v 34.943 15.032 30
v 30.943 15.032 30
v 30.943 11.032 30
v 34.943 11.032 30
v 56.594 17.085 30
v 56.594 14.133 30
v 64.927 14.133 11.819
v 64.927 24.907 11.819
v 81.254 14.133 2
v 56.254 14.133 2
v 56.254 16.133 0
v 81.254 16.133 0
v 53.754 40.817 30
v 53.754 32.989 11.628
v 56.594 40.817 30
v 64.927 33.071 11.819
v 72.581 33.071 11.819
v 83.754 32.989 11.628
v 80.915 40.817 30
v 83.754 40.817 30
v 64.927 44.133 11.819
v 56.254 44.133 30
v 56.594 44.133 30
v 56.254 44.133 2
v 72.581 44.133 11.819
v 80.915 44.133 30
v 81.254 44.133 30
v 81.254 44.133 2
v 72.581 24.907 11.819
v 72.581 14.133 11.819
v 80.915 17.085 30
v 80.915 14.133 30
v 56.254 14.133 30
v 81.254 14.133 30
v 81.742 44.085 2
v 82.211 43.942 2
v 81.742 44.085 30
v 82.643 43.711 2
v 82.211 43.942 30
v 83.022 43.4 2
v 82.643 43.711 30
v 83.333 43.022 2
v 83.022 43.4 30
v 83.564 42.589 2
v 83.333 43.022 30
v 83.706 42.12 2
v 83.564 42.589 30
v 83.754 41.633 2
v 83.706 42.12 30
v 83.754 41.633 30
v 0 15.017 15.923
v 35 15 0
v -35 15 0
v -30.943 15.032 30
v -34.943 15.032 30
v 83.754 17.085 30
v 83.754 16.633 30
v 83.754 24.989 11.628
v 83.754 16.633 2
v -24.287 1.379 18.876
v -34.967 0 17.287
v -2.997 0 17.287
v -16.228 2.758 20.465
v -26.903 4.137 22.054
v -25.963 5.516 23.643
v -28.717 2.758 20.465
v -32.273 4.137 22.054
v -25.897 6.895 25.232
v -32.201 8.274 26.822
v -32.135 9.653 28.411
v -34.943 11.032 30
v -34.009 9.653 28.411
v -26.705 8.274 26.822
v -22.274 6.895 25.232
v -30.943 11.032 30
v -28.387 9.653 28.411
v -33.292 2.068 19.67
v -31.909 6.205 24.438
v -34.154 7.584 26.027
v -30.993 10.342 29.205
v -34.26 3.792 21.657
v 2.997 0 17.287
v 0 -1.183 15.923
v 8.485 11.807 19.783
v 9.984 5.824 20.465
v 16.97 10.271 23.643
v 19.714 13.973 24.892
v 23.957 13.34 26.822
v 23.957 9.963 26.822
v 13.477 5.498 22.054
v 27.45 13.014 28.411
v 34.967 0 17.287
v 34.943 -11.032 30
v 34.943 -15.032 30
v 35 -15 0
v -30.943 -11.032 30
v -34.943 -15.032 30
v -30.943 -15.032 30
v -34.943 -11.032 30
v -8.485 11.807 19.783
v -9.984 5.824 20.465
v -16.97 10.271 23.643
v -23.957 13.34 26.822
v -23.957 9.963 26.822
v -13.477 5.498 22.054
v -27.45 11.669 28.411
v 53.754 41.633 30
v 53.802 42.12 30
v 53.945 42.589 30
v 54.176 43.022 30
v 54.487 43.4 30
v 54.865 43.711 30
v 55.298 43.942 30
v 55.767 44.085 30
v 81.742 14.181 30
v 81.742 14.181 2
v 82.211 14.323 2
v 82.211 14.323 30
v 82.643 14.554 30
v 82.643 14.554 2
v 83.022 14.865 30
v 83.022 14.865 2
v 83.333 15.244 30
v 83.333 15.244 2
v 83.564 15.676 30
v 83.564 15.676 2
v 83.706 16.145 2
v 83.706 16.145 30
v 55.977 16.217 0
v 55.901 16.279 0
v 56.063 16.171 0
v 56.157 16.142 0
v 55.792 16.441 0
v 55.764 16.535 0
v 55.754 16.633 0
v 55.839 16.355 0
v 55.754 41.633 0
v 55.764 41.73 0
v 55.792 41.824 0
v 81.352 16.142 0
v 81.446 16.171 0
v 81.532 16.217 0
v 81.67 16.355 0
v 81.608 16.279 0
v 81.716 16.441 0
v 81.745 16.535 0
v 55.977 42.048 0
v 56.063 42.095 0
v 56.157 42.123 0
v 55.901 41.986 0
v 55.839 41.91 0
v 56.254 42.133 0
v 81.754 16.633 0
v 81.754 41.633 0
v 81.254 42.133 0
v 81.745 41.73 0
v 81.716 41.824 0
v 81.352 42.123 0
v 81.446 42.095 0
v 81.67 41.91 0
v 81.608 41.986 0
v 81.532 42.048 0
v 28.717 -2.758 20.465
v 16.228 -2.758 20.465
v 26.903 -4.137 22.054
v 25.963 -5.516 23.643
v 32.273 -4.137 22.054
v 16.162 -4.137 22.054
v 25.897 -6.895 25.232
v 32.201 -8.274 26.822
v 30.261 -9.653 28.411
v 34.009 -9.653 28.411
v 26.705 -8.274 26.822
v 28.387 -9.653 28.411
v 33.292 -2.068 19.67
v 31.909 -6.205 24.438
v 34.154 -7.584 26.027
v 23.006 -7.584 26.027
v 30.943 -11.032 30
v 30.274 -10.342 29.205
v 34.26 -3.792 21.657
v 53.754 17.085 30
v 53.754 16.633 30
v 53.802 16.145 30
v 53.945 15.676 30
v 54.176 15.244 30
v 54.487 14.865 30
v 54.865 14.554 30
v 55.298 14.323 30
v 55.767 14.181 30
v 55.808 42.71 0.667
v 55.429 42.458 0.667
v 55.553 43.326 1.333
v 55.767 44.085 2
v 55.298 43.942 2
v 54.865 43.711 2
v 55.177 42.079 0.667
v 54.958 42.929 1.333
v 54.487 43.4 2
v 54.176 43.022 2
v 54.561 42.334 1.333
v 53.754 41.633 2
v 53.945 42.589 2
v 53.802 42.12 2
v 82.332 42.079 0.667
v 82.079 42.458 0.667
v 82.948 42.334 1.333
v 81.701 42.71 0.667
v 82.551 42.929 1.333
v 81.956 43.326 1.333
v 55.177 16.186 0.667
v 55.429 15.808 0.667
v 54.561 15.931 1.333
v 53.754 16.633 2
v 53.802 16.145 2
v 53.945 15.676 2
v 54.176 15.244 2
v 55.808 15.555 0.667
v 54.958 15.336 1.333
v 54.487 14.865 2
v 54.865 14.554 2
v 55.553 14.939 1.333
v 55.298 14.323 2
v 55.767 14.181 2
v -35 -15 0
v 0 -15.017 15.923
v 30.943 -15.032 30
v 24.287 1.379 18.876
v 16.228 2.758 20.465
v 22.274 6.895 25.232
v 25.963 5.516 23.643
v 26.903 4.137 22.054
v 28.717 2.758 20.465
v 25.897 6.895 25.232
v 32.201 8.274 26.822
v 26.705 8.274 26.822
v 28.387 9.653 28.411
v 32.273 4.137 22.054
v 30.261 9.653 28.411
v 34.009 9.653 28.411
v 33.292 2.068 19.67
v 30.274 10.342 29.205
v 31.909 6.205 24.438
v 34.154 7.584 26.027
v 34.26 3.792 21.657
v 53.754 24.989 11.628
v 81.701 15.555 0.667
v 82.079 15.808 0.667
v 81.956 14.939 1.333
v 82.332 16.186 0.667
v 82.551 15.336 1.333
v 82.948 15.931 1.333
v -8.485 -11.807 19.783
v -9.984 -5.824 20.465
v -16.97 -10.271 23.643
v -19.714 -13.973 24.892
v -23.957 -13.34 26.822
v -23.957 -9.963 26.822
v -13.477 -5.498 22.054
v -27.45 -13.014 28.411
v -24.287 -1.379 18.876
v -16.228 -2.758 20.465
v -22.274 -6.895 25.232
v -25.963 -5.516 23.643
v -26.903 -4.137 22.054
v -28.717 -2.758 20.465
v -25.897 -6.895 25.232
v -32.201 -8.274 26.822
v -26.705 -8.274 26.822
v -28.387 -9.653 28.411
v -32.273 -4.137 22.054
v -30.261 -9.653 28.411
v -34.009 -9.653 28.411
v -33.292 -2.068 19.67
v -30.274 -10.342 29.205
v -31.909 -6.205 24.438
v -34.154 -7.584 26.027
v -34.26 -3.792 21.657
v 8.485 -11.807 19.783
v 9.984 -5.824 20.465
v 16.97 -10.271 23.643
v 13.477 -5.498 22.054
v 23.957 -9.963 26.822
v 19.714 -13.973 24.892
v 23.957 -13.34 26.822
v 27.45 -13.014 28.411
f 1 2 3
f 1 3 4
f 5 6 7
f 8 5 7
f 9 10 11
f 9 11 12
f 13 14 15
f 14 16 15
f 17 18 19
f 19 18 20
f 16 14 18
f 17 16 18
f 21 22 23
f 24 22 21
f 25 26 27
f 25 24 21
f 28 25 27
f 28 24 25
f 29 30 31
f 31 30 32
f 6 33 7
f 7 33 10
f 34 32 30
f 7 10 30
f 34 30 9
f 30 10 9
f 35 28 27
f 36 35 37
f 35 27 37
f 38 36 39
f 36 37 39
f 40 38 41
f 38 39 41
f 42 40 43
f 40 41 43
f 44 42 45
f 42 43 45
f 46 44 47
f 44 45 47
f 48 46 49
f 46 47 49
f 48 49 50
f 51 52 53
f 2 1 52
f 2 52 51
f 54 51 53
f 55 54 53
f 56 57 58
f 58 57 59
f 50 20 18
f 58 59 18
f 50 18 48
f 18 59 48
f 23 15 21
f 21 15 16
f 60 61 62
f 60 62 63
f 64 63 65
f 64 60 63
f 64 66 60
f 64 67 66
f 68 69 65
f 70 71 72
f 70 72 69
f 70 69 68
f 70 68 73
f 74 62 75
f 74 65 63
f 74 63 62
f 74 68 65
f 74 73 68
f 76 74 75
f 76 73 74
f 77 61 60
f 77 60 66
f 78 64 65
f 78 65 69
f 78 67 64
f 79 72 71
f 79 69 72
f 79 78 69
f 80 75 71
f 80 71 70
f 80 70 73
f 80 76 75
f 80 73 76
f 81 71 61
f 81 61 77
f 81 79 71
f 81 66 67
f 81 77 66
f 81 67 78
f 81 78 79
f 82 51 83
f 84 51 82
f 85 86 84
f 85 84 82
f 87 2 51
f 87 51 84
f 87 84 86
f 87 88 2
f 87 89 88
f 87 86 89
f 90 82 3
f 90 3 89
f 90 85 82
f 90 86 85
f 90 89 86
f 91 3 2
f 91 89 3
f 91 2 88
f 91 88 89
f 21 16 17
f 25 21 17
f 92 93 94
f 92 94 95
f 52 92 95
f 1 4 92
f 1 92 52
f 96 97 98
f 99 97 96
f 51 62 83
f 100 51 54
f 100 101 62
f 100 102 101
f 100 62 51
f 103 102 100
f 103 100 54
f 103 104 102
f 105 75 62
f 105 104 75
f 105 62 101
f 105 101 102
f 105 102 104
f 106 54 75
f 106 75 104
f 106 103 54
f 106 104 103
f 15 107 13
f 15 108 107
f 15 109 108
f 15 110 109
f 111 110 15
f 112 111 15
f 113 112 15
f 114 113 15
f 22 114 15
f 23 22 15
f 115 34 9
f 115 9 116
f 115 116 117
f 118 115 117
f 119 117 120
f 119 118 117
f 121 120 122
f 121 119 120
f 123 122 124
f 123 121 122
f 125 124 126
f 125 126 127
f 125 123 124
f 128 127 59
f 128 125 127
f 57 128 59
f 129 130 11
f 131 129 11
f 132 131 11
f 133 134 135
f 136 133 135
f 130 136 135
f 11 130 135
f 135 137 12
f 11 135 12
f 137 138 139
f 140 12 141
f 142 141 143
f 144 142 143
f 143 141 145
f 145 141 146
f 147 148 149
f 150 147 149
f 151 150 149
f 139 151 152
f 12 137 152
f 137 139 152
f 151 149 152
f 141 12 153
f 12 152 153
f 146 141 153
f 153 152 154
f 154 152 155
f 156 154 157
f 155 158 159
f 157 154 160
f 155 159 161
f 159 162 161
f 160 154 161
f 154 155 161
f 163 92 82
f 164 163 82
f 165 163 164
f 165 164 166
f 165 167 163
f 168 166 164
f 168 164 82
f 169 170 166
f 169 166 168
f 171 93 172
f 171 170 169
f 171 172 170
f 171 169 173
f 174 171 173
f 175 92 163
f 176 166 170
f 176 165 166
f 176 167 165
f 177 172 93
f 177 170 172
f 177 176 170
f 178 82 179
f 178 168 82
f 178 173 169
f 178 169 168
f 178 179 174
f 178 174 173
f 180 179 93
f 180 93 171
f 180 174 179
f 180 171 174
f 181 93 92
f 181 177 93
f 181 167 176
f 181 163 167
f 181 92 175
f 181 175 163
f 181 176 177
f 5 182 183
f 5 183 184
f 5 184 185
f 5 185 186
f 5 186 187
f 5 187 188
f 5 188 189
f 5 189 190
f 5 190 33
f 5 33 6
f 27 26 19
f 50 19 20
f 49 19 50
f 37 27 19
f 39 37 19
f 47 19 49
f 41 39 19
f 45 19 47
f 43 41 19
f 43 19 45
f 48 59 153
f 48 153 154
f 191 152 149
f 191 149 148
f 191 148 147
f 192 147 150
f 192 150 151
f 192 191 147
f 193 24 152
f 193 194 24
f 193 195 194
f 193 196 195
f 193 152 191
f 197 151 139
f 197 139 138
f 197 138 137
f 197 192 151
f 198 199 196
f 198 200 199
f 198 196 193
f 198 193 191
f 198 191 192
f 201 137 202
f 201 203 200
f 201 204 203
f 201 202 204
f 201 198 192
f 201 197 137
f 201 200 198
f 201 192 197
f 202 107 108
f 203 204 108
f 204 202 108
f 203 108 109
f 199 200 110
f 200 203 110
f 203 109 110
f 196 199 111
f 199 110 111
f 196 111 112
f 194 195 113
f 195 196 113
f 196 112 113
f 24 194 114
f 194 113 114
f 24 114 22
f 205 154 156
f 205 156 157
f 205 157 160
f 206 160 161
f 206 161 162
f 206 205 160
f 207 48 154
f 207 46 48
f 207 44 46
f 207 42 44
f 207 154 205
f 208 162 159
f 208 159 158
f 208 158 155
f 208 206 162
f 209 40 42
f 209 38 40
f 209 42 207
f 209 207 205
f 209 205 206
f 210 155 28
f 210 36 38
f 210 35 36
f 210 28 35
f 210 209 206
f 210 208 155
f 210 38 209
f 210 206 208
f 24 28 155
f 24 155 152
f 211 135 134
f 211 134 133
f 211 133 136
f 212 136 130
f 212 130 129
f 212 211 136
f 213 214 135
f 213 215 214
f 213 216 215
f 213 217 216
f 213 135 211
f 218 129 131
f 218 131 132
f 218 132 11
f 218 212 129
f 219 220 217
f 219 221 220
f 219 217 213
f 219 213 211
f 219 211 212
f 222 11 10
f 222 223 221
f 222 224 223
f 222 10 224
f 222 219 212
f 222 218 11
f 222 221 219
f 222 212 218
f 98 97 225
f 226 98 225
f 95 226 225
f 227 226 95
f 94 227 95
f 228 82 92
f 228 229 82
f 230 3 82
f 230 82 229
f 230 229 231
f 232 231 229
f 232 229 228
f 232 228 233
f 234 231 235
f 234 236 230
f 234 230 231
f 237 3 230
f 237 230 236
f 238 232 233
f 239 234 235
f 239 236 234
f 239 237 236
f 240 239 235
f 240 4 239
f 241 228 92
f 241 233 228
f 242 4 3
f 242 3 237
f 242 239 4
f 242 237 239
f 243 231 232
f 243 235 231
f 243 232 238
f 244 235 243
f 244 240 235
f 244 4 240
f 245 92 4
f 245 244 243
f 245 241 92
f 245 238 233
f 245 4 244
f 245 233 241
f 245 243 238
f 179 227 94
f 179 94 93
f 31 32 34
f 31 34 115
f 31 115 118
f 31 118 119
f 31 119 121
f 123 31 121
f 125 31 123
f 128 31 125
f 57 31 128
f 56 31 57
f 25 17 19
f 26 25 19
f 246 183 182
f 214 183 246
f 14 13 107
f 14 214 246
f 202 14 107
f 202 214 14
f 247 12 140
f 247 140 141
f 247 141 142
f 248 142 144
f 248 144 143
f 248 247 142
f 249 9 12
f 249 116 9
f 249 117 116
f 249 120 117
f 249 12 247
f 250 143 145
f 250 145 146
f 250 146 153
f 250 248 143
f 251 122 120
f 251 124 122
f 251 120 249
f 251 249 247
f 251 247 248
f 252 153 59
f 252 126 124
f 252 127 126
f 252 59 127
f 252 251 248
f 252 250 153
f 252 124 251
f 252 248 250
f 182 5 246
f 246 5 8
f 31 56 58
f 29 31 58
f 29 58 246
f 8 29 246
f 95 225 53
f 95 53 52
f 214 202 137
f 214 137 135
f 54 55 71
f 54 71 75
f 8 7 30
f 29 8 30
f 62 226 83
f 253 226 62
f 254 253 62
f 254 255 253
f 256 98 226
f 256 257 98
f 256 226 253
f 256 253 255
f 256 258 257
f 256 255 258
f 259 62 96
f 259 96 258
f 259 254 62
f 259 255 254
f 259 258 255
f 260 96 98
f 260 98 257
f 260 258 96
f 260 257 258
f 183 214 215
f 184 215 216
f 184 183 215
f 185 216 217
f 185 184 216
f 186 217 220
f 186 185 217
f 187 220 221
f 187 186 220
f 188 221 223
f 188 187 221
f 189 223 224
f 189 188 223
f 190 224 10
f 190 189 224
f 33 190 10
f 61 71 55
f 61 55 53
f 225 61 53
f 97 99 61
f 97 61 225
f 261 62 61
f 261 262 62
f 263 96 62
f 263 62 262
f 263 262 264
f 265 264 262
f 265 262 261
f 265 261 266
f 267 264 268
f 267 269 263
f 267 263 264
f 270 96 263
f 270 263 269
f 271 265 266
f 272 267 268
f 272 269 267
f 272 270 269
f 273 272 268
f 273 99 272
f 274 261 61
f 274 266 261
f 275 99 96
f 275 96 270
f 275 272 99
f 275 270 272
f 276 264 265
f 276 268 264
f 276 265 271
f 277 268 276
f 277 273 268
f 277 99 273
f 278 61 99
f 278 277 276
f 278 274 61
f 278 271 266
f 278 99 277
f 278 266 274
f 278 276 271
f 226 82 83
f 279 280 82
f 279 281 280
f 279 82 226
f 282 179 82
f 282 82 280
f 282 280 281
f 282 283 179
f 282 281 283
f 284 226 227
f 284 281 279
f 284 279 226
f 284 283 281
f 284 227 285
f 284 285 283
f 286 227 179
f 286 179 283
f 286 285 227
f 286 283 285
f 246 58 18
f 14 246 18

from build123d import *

# Parameters (mm, degrees)
F0_W      = 70
F0_H      = 30
F2_W      = 4
F2_H      = 4
F7_W      = 30
F7_H      = 30
F8_DEPTH  = 30
F10_DEPTH = 30
F12_DEPTH = 30
F13_R     = 2.5
F14_SIZE  = 2
F16_DEPTH = 1


# Not quite as in the source:
# - the program builds the solid bodies; features that only make, move or delete a surface that nothing else refers to are left out


with BuildPart() as f3:
    # F0 (on Top) → F3 section 0
    with BuildSketch(Plane.XY):
        Rectangle(F0_W, F0_H)
    # F2 (on offset) → F3 section 1
    with BuildSketch(Plane.XY.offset(30)):
        with Locations((-32.9428877234, 13.0318499655)):
            Rectangle(F2_W, F2_H)
    loft()

    # F0 (on Top) → F4 section 0
    with BuildSketch(Plane.XY):
        Rectangle(F0_W, F0_H)
    # F2 (on offset) → F4 section 1
    with BuildSketch(Plane.XY.offset(30)):
        with Locations((-32.9428877234, -13.0318499655)):
            Rectangle(F2_W, F2_H)
    loft()

    # F0 (on Top) → F5 section 0
    with BuildSketch(Plane.XY):
        Rectangle(F0_W, F0_H)
    # F2 (on offset) → F5 section 1
    with BuildSketch(Plane.XY.offset(30)):
        with Locations((32.9428877234, 13.0318499655)):
            Rectangle(F2_W, F2_H)
    loft()

    # F0 (on Top) → F6 section 0
    with BuildSketch(Plane.XY):
        Rectangle(F0_W, F0_H)
    # F2 (on offset) → F6 section 1
    with BuildSketch(Plane.XY.offset(30)):
        with Locations((32.9428877234, -13.0318499655)):
            Rectangle(F2_W, F2_H)
    loft()

    # F15 (on face) → F16 (cut)
    with BuildSketch(Plane.XY):
        with BuildLine():
            Line((35.1080348898, -15.1526350975), (34.9516024797, -15.1445783328))
            add(Edge.make_bspline(
                [(34.9516024797, -15.1445783328), (35.015165041, -15.1823826041), (35.0943421483, -15.2143125307), (35.1068899686, -15.1744342874), (35.1080348898, -15.1526350975)],
                knots=[0.9766966093, 0.9766966093, 0.9766966093, 0.9766966093, 0.9875020446, 0.9956975312, 0.9956975312, 0.9956975312, 0.9956975312], degree=3))
        make_face()
        with BuildLine():
            add(Edge.make_bspline(
                [(34.9719375372, 15.0837432593), (34.3538024078, 14.0181605259), (33.061090265, 11.7896967595), (28.21171153, 13.2006080373), (27.1952390941, 9.3934277248), (29.922433417, 8.7236693731), (30.66603681, 5.9963298393), (28.2491739951, 4.334922985), (27.3280801702, 1.5528957375), (30.0258958231, -0.6289713137), (28.5607968581, -2.7152455487), (26.9189490059, -6.683113184), (28.0022887063, -10.124238159), (31.4043979295, -12.0624753884), (34.4968064554, -14.8740852642), (34.9516024797, -15.1445783328)],
                knots=[0, 0, 0, 0, 0.0798778427, 0.1670493267, 0.2351952706, 0.3009592707, 0.365159693, 0.4364229102, 0.5052200474, 0.5772019582, 0.6402928372, 0.7295168151, 0.8063783849, 0.8993827171, 0.9766966093, 0.9766966093, 0.9766966093, 0.9766966093], degree=3))
            Line((34.9719375372, 15.0837432593), (30.7977404445, 15.1190953329))
            add(Edge.make_bspline(
                [(30.7977404445, 15.1190953329), (27.9337164263, 14.9101728987), (23.2612948103, 14.5693329856), (21.9160397808, 10.5126541312), (24.7378669193, 8.603835829), (26.4017007473, 6.8089006332), (24.7706534907, 4.1161935184), (23.430847623, 2.0997794876), (24.2510655844, -0.0048017343), (23.8127653987, -3.4550826329), (22.7751457805, -5.8090586344), (23.1402314335, -9.1926239549), (26.1749460731, -14.6137627403), (29.3308994565, -14.8300937762), (30.7977404445, -14.9306412786)],
                knots=[0, 0, 0, 0, 0.1234279581, 0.2013626477, 0.2811427777, 0.3472159084, 0.4234693912, 0.4927276654, 0.5582341134, 0.6420069112, 0.7141429329, 0.7966122672, 0.9054683556, 1, 1, 1, 1], degree=3))
            Line((30.7977404445, -14.9306412786), (34.9516024797, -15.1445783328))
        make_face()
        with BuildLine():
            Line((-30.7977404445, 15.1190953329), (-34.9719375372, 15.0837432593))
            add(Edge.make_bspline(
                [(-34.9719375372, 15.0837432593), (-34.3538024078, 14.0181605259), (-33.061090265, 11.7896967595), (-28.21171153, 13.2006080373), (-27.1952390941, 9.3934277248), (-29.922433417, 8.7236693731), (-30.66603681, 5.9963298393), (-28.2491739951, 4.334922985), (-27.3280801702, 1.5528957375), (-30.0258958231, -0.6289713137), (-28.5607968581, -2.7152455487), (-26.9189490059, -6.683113184), (-28.0022887063, -10.124238159), (-31.5081547913, -12.1215873684), (-34.7720178817, -15.125865809), (-35.0565479429, -15.1937999645)],
                knots=[0, 0, 0, 0, 0.0798778427, 0.1670493267, 0.2351952706, 0.3009592707, 0.365159693, 0.4364229102, 0.5052200474, 0.5772019582, 0.6402928372, 0.7295168151, 0.8063783849, 0.8993827171, 0.9842350503, 0.9842350503, 0.9842350503, 0.9842350503], degree=3))
            Line((-35.0565479429, -15.1937999645), (-30.7977404445, -14.9306412786))
            add(Edge.make_bspline(
                [(-30.7977404445, 15.1190953329), (-27.9337164263, 14.9101728987), (-23.2612948103, 14.5693329856), (-21.9160397808, 10.5126541312), (-24.7378669193, 8.603835829), (-26.4017007473, 6.8089006332), (-24.7706534907, 4.1161935184), (-23.430847623, 2.0997794876), (-24.2510655844, -0.0048017343), (-23.8127653987, -3.4550826329), (-22.7751457805, -5.8090586344), (-23.1402314335, -9.1926239549), (-26.1749460731, -14.6137627403), (-29.3308994565, -14.8300937762), (-30.7977404445, -14.9306412786)],
                knots=[0, 0, 0, 0, 0.1234279581, 0.2013626477, 0.2811427777, 0.3472159084, 0.4234693912, 0.4927276654, 0.5582341134, 0.6420069112, 0.7141429329, 0.7966122672, 0.9054683556, 1, 1, 1, 1], degree=3))
        make_face()
        with BuildLine():
            add(Edge.make_bspline(
                [(-35.0565479429, -15.1937999645), (-35.067502952, -15.1964155731), (-35.0765714389, -15.197007162), (-35.0836701691, -15.1954758912)],
                knots=[0.9842350503, 0.9842350503, 0.9842350503, 0.9842350503, 0.9875020446, 0.9875020446, 0.9875020446, 0.9875020446], degree=3))
            Line((-35.0565479429, -15.1937999645), (-35.0836701691, -15.1954758912))
        make_face()
    extrude(amount=-F16_DEPTH, mode=Mode.SUBTRACT)


with BuildPart() as f8:
    # F7 (on Top) → F8 (new body)
    with BuildSketch(Plane.XY):
        with Locations((68.754363209, 29.132604003)):
            Rectangle(F7_W, F7_H)
    extrude(amount=F8_DEPTH)

    # F9 (on face) → F10 (cut)
    with BuildSketch(Plane.XZ.offset(-14.132604003)):
        Polygon((80.9148873389, 30), (56.5938390791, 30), (64.9274835954, 11.818955776), (68.754363209, 11.818955776), (72.5812428226, 11.818955776), align=None)
    extrude(amount=-F10_DEPTH, mode=Mode.SUBTRACT)

    # F11 (on face) → F12 (cut)
    with BuildSketch(Plane.YZ.offset(83.754363209)):
        Polygon((40.8168919384, 30), (17.0854497701, 30), (24.9892928991, 11.6280304868), (32.9892928991, 11.6280304868), align=None)
    extrude(amount=-F12_DEPTH, mode=Mode.SUBTRACT)

    # F13
    f13_edges = [f8.edges().sort_by_distance(p)[0] for p in [
        (83.754363, 14.132604, 15),
        (53.754363, 14.132604, 15),
        (83.754363, 44.132604, 15),
        (53.754363, 44.132604, 15),
    ]]
    fillet(f13_edges, radius=F13_R)

    # F14
    f14_edges = [f8.edges().sort_by_distance(p)[0] for p in [
        (83.754363, 29.132604, 0),
    ]]
    chamfer(f14_edges, length=F14_SIZE)


solid = Compound([f3.part, f8.part])
